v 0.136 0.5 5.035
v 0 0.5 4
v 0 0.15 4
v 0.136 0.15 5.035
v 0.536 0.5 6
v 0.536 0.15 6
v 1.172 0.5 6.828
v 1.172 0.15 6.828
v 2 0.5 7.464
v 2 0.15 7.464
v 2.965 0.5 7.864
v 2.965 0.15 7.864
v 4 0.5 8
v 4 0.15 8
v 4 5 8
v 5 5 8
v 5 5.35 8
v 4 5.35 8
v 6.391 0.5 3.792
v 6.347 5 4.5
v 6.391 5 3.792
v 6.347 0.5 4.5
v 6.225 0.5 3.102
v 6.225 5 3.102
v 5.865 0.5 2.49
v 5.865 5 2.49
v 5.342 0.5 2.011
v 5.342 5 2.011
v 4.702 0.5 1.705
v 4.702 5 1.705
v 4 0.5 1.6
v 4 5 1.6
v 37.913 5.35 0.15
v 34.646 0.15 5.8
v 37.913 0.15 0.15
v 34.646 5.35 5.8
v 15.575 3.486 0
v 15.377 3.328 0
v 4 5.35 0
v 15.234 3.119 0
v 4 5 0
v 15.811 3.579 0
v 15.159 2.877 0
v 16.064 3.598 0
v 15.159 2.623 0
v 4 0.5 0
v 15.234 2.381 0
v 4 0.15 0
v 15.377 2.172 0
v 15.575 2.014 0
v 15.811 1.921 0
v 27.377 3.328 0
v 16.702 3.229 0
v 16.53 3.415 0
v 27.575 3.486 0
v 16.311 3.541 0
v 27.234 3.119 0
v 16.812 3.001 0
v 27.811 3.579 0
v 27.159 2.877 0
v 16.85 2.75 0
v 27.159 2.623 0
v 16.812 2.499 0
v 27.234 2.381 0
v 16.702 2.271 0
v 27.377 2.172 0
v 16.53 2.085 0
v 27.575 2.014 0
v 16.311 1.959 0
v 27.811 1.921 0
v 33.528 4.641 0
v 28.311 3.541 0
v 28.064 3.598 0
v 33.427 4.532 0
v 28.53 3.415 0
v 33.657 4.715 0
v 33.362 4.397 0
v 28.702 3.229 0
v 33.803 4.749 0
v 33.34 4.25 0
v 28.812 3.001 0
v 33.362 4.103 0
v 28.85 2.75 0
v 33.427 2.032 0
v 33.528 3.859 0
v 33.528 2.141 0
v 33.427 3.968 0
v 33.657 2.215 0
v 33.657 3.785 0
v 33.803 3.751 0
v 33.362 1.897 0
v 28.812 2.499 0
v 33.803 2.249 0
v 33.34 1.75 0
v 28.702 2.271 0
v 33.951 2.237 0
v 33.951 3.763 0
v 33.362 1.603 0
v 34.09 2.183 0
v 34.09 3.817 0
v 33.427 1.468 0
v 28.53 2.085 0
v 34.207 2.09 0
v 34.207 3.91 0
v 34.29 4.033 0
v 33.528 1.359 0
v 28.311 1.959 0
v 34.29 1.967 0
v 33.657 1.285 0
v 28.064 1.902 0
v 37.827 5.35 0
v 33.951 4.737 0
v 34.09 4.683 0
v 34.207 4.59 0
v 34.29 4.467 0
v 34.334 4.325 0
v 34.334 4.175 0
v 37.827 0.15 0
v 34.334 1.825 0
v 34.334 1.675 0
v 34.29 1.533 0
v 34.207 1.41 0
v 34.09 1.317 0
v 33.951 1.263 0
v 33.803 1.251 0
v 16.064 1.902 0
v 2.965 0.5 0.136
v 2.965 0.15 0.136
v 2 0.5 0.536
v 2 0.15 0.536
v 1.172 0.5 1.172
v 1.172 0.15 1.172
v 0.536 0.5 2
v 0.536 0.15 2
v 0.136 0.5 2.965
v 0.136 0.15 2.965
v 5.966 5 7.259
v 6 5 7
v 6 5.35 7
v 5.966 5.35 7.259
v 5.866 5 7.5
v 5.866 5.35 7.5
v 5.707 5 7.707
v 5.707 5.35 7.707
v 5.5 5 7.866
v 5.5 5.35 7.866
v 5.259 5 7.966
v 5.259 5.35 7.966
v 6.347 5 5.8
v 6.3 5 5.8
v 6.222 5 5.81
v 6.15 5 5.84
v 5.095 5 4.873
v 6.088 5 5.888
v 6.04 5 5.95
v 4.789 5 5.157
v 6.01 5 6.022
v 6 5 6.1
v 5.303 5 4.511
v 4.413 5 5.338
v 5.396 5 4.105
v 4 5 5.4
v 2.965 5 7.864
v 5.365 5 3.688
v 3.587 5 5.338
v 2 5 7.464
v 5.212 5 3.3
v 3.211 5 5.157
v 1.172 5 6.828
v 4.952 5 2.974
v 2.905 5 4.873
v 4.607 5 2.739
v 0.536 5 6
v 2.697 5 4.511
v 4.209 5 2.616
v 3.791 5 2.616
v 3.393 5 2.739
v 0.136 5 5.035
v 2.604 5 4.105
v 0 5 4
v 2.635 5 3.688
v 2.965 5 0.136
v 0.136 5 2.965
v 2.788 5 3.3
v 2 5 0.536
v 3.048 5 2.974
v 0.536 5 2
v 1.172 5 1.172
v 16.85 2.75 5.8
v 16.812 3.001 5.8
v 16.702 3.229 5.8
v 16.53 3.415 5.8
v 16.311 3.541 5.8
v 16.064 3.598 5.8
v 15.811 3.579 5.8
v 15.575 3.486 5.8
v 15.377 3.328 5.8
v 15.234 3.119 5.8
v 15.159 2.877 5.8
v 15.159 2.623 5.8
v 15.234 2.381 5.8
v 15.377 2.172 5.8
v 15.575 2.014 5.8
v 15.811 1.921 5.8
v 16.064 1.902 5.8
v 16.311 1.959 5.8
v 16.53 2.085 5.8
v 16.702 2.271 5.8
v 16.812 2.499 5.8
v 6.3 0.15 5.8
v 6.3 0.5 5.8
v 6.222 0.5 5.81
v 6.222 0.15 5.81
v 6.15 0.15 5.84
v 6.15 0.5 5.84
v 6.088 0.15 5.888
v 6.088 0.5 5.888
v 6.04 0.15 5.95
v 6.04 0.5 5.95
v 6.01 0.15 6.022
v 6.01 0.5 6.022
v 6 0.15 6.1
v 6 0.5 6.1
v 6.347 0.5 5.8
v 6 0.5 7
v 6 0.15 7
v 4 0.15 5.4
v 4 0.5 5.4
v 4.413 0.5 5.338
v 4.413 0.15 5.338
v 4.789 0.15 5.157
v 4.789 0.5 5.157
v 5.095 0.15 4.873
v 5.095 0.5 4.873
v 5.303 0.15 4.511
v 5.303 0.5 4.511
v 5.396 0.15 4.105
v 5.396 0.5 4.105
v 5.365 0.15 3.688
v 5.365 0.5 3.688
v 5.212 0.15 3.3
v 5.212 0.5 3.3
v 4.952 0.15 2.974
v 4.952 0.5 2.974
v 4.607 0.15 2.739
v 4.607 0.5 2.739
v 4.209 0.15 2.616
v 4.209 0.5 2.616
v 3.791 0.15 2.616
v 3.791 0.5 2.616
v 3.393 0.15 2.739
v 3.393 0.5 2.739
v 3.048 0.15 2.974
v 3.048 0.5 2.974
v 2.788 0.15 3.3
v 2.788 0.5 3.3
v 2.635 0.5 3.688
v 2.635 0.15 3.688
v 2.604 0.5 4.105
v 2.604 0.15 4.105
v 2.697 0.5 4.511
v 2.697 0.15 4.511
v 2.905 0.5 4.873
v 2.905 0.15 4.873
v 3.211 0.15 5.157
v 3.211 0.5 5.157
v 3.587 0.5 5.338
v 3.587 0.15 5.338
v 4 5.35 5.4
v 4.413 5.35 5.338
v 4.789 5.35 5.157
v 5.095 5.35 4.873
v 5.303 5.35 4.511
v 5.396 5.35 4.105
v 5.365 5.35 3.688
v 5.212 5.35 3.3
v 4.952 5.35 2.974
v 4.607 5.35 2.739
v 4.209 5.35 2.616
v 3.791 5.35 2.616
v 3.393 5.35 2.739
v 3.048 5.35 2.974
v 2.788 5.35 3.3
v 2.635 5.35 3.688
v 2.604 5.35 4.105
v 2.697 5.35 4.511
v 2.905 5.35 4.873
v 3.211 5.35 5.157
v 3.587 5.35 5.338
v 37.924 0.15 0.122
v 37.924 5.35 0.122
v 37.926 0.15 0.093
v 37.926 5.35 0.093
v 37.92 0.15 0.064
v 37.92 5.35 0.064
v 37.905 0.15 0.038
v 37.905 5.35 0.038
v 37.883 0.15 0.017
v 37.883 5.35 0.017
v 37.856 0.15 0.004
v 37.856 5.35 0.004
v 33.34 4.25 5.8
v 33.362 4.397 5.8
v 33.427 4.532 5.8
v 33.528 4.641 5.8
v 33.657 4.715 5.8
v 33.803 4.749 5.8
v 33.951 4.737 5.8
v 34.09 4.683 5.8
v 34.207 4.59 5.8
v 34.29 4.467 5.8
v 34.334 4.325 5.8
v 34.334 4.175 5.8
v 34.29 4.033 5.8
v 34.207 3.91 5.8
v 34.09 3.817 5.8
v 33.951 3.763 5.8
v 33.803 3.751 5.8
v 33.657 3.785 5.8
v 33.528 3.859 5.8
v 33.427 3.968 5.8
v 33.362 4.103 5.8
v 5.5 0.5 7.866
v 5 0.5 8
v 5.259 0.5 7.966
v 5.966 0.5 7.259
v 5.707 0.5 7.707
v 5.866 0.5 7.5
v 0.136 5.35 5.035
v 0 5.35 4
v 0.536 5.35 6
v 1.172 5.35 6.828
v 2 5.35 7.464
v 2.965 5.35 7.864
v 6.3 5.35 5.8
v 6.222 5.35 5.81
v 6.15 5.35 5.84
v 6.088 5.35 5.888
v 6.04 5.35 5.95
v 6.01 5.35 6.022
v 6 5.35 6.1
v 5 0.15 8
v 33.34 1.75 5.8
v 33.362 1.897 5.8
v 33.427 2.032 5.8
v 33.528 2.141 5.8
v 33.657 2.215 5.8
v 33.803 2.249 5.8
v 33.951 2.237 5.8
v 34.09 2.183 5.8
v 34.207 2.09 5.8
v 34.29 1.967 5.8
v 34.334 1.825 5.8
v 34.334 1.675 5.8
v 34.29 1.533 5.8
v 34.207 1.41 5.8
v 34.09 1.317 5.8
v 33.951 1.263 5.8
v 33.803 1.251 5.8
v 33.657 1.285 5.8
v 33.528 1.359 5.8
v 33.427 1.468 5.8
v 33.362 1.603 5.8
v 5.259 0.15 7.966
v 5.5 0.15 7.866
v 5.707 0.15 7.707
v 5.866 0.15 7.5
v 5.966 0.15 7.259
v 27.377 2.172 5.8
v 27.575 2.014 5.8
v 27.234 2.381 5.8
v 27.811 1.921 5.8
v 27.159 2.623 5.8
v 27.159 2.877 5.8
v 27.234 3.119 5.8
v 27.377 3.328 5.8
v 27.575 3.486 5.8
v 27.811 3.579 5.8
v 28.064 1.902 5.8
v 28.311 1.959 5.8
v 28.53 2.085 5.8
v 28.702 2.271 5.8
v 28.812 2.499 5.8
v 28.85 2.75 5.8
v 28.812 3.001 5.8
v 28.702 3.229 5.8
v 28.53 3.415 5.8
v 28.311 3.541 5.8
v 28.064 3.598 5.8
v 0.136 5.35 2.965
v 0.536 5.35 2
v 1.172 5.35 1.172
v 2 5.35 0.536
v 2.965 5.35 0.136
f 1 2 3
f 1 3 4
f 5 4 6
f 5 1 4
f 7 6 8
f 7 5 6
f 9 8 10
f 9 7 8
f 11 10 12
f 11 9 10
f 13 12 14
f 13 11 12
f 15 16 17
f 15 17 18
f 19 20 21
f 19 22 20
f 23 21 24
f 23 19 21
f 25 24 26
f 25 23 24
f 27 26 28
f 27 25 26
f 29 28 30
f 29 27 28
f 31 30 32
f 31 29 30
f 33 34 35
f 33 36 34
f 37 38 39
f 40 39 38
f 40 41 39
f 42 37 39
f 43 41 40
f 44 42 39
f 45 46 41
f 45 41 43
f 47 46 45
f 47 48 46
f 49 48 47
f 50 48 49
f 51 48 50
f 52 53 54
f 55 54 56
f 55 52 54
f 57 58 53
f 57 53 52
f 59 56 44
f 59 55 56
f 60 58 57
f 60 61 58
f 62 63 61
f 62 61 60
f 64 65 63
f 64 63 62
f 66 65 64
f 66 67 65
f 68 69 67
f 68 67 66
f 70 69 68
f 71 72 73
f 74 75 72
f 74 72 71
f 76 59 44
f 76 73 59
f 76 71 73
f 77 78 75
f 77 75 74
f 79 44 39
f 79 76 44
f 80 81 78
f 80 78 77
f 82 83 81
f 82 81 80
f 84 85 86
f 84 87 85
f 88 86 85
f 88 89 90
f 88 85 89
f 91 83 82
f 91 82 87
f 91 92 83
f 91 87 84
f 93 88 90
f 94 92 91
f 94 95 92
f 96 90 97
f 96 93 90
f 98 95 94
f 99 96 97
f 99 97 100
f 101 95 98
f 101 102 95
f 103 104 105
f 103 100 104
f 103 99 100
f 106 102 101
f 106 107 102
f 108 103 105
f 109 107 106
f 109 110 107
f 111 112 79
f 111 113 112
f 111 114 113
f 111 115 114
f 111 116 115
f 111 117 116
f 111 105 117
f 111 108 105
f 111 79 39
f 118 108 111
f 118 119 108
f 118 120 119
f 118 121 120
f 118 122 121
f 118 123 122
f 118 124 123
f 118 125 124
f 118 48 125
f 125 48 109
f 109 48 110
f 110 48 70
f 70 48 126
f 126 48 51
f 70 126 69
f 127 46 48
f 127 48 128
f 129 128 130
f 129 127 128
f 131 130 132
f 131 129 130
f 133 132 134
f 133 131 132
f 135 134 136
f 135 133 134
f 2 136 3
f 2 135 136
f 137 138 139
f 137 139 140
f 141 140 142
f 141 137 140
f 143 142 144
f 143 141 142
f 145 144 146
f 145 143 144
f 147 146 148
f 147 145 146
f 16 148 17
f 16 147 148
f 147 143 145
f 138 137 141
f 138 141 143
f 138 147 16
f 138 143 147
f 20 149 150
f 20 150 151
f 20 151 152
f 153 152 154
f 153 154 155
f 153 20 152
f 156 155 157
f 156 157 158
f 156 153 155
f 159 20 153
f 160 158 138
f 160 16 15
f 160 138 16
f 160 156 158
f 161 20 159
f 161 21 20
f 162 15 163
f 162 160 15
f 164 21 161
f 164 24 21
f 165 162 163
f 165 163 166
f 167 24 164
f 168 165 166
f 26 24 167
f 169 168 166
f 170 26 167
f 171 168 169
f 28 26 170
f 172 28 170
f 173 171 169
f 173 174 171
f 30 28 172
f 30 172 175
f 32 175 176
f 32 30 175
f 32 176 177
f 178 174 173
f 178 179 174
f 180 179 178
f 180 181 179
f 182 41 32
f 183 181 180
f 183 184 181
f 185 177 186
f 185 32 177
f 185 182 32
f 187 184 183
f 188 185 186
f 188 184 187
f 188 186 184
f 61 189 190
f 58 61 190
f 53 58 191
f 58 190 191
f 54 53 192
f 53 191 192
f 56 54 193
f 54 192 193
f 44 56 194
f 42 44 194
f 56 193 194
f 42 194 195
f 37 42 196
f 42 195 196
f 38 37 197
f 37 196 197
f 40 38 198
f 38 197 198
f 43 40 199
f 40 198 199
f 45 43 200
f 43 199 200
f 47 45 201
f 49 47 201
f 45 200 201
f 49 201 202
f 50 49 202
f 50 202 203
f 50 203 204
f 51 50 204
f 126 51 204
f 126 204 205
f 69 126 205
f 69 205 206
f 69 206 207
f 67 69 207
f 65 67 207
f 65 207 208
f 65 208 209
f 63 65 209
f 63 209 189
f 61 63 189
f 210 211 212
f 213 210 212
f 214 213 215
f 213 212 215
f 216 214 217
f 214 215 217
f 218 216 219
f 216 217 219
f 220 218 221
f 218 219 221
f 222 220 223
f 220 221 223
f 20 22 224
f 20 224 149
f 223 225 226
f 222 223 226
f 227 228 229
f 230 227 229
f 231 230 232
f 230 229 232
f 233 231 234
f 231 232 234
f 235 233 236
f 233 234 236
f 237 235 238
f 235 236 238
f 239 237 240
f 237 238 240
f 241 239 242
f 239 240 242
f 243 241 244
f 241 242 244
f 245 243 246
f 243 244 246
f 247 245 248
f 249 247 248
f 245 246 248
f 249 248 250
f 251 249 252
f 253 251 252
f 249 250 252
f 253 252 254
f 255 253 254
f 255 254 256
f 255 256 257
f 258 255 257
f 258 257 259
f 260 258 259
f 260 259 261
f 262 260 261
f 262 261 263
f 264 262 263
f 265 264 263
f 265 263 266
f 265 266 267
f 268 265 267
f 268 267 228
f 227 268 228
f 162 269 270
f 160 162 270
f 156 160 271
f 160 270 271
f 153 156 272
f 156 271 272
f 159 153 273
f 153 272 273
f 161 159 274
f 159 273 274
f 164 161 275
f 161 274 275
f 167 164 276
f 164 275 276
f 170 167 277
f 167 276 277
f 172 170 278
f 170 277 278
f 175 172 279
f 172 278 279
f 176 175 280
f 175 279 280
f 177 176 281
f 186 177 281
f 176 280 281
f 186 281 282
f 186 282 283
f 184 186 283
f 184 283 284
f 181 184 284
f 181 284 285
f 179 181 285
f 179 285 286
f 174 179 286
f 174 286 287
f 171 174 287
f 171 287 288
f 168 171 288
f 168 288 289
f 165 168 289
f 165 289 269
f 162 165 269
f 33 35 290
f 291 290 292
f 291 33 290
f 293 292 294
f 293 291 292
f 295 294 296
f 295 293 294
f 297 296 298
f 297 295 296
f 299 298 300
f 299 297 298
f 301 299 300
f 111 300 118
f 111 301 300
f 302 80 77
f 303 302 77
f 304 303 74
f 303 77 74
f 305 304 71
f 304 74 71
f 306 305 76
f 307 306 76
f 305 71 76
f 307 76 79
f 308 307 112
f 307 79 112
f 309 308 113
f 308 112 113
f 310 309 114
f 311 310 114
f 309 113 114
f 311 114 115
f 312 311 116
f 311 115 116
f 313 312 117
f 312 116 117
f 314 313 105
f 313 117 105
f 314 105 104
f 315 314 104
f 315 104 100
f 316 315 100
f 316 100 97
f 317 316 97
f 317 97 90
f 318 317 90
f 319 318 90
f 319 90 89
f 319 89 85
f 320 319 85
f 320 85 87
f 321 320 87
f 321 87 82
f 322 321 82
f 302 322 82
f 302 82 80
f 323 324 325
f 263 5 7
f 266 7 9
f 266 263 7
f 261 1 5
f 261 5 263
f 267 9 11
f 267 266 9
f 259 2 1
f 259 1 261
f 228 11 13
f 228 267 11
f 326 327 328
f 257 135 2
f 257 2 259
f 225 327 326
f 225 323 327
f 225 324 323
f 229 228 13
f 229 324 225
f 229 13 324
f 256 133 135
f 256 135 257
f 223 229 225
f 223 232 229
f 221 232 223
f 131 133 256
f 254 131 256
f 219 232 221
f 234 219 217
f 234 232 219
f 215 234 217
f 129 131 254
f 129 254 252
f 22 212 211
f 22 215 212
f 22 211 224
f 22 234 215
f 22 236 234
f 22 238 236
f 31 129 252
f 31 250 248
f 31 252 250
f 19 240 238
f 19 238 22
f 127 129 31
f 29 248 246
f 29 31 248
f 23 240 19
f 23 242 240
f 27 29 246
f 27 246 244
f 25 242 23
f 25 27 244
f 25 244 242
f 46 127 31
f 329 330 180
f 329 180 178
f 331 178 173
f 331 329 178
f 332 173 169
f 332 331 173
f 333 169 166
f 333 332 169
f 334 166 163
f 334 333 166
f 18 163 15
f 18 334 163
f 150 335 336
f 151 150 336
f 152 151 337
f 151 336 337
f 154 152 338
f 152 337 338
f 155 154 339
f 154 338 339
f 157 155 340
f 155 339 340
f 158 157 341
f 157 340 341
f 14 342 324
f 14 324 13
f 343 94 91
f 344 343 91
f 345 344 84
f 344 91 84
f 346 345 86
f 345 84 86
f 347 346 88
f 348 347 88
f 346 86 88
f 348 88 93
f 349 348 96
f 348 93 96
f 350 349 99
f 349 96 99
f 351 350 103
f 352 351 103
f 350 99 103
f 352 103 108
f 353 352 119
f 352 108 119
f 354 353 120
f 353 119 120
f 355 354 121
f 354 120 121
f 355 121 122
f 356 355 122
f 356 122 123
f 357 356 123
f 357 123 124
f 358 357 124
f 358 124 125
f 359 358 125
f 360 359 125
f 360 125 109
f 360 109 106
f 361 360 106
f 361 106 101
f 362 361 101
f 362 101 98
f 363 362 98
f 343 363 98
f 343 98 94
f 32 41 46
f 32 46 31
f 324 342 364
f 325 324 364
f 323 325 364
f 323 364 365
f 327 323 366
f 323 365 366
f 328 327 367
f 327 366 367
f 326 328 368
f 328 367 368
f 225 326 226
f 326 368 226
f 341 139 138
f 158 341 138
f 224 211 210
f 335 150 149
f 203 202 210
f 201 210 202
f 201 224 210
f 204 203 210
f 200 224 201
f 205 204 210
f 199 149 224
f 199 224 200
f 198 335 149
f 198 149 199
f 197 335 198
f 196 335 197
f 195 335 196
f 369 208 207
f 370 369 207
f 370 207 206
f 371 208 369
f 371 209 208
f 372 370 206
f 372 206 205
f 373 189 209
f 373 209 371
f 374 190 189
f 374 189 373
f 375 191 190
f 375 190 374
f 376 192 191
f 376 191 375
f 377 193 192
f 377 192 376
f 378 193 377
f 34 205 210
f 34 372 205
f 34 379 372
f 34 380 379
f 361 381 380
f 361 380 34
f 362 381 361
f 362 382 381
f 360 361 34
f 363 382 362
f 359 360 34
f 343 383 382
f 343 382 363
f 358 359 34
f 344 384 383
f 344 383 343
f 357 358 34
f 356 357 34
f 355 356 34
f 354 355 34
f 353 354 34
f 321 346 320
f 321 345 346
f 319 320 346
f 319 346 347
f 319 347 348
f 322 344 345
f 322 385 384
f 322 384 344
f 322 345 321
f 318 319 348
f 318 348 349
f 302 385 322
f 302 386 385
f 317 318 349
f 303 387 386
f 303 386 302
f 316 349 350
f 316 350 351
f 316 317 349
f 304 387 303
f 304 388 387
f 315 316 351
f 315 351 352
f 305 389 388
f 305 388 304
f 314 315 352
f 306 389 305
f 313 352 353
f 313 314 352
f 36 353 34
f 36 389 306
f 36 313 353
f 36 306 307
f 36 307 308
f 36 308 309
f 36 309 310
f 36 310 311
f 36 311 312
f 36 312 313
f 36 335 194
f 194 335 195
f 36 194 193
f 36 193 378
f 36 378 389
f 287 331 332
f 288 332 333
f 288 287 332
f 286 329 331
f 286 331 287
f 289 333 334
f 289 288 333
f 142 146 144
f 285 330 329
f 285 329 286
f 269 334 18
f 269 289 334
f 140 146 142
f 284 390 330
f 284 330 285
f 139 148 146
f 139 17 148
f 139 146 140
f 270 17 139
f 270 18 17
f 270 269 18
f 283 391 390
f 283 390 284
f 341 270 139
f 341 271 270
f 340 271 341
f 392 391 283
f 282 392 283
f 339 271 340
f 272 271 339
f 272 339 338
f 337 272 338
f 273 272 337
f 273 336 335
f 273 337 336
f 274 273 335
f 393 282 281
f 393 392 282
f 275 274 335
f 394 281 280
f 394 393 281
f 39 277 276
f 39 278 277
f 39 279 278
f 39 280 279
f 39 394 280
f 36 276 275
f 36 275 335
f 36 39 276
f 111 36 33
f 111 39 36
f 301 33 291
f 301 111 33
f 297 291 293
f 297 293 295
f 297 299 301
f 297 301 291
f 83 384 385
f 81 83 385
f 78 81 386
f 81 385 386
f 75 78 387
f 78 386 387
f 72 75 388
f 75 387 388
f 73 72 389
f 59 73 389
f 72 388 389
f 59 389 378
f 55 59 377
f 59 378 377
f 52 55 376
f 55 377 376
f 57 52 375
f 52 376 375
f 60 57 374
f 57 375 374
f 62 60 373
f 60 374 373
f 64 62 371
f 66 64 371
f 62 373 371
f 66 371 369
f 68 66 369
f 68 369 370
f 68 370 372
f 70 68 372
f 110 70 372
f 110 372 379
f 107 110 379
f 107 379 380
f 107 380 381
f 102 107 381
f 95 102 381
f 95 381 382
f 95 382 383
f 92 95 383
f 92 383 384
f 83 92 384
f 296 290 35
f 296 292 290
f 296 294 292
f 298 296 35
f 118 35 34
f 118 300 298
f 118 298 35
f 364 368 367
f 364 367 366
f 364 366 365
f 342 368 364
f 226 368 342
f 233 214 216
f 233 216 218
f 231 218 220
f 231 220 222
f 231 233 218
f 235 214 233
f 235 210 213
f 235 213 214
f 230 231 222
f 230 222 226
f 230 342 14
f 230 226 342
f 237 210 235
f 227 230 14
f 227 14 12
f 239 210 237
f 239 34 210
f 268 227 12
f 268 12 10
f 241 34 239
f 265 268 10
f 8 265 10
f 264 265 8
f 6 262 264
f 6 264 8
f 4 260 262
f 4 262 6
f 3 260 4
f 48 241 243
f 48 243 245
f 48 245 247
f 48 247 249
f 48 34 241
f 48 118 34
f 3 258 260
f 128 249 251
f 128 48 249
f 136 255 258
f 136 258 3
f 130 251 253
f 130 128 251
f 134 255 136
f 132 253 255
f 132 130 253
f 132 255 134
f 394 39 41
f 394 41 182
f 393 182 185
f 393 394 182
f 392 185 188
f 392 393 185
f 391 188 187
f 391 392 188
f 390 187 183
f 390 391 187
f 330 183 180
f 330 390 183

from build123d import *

# Parameters (mm, degrees)
BOSS_EXTRUDE1_DEPTH    = 5.5
CUT_EXTRUDE1_DEPTH     = 3.5
FILLET2_R              = 4
SKETCH19_R             = 1.4
CUT_EXTRUDE3_DEPTH     = 6.3
SKETCH21_R             = 2.4
CUT_EXTRUDE4_DEPTH     = 4.5
BOSS_EXTRUDE3_DEPTH    = 1.3
FILLET5_R              = 0.3
FILLET6_R              = 1
BOSS_EXTRUDE4_DEPTH    = 5.5
SKETCH13_R             = 0.5
CUT_EXTRUDE5_DEPTH     = 6.5
FILLET7_R              = 0.1
SKETCH30_W             = 41.665308381
SKETCH30_H             = 8.97901041
CUT_EXTRUDE6_DEPTH     = 0.15
SKETCH31_W             = 41.594909832
SKETCH31_H             = 8.905627214
CUT_EXTRUDE7_DEPTH     = 0.15
M1_6_CLEARANCE_HOLE1_D = 1.7
CUT_EXTRUDE8_DEPTH     = 4.5


with BuildPart() as part:
    # Sketch1 → Boss-Extrude1 (new body)
    with BuildSketch(Plane(origin=(0, 0, 0), x_dir=(1, 0, 0), z_dir=(0, 1, 0))):
        Polygon((0, 0), (38, 0), (30, -8), (0, -8), align=None)
    extrude(amount=BOSS_EXTRUDE1_DEPTH)

    # Sketch4 → Cut-Extrude1 (cut)
    with BuildSketch(Plane.XY.offset(8)):
        Polygon((0, 0.5), (6, 0.5), (6, 0), (38, 0), (38, 5.5), (6, 5.5), (6, 5), (0, 5), align=None)
    extrude(amount=-CUT_EXTRUDE1_DEPTH, mode=Mode.SUBTRACT)

    # Fillet2
    fillet2_edges = [part.edges().sort_by_distance(p)[0] for p in [
        (0, 5.25, 8),
        (0, 2.75, 0),
    ]]
    fillet(fillet2_edges, radius=FILLET2_R - 0.0001)  # a hair under: the kernel refuses the full size

    # Sketch19 → Cut-Extrude3 (cut)
    with BuildSketch(Plane(origin=(0, 5.5, 0), x_dir=(1, 0, 0), z_dir=(0, 1, 0))):
        with Locations(Location((4, -4, 0), (0, 0, 270))):
            Circle(SKETCH19_R)
    extrude(amount=-CUT_EXTRUDE3_DEPTH, mode=Mode.SUBTRACT)

    # Sketch21 → Cut-Extrude4 (cut)
    with BuildSketch(Plane(origin=(0, 0.5, 0), x_dir=(1, 0, 0), z_dir=(0, 1, 0))):
        with Locations((4, -4)):
            Circle(SKETCH21_R)
    extrude(amount=CUT_EXTRUDE4_DEPTH, mode=Mode.SUBTRACT)

    # Sketch22 → Boss-Extrude3 (add)
    with BuildSketch(Plane.XY.offset(4.5)):
        Polygon((6.347338919, 5), (6, 5), (6, 5.5), (33.5, 5.5), (33.5, 0), (6, 0), (6, 0.5), (6.347338919, 0.5), align=None)
    extrude(amount=BOSS_EXTRUDE3_DEPTH)

    # Fillet5
    fillet5_edges = [part.edges().sort_by_distance(p)[0] for p in [
        (6, 0.25, 5.8),
        (6, 5.25, 5.8),
    ]]
    fillet(fillet5_edges, radius=FILLET5_R)

    # Fillet6
    fillet6_edges = [part.edges().sort_by_distance(p)[0] for p in [
        (6, 5.25, 8),
        (6, 0.25, 8),
    ]]
    fillet(fillet6_edges, radius=FILLET6_R)

    # Sketch25 → Boss-Extrude4 (add)
    with BuildSketch(Plane(origin=(0, 5.5, 0), x_dir=(1, 0, 0), z_dir=(0, 1, 0))):
        Polygon((38, 0), (33.5, -4.5), (33.5, -5.8), (34.646204889, -5.8), align=None)
    extrude(amount=-BOSS_EXTRUDE4_DEPTH)

    # Sketch13 → Cut-Extrude5 (cut)
    with BuildSketch(Plane(origin=(0, 0, 0), x_dir=(-1, 0, 0), z_dir=(0, 0, -1))):
        with Locations((-33.84, 4.25)):
            Circle(SKETCH13_R)
        with Locations((-33.84, 1.75)):
            Circle(SKETCH13_R)
    extrude(amount=-CUT_EXTRUDE5_DEPTH, mode=Mode.SUBTRACT)

    # Fillet7
    fillet7_edges = [part.edges().sort_by_distance(p)[0] for p in [
        (38, 2.75, 0),
    ]]
    fillet(fillet7_edges, radius=FILLET7_R)

    # Sketch30 → Cut-Extrude6 (cut)
    with BuildSketch(Plane(origin=(0, 5.5, 0), x_dir=(1, 0, 0), z_dir=(0, 1, 0))):
        with Locations((19.118021654, -4.03845395)):
            Rectangle(SKETCH30_W, SKETCH30_H)
    extrude(amount=-CUT_EXTRUDE6_DEPTH, mode=Mode.SUBTRACT)

    # Sketch31 → Cut-Extrude7 (cut)
    with BuildSketch(Plane(origin=(0, 0, 0), x_dir=(-1, 0, 0), z_dir=(0, -1, 0))):
        with Locations((-18.959670937, -4.021529517)):
            Rectangle(SKETCH31_W, SKETCH31_H)
    extrude(amount=-CUT_EXTRUDE7_DEPTH, mode=Mode.SUBTRACT)

    # M1.6 Clearance Hole1 (through all)
    with Locations(Plane(origin=(0, 0, 0), x_dir=(-1, 0, 0), z_dir=(0, 0, -1))):
        with Locations((-16, 2.75), (-28, 2.75)):
            Hole(M1_6_CLEARANCE_HOLE1_D / 2)

    # Sketch37 → Cut-Extrude8 (cut)
    with BuildSketch(Plane.XZ.offset(-5)):
        with BuildLine():
            Line((4, -0.442176814), (4, 8.442176814))
            ThreePointArc((4, 8.442176814), (-0.442176814, 4), (4, -0.442176814))
        make_face()
    extrude(amount=CUT_EXTRUDE8_DEPTH, mode=Mode.SUBTRACT)


solid = part.part
